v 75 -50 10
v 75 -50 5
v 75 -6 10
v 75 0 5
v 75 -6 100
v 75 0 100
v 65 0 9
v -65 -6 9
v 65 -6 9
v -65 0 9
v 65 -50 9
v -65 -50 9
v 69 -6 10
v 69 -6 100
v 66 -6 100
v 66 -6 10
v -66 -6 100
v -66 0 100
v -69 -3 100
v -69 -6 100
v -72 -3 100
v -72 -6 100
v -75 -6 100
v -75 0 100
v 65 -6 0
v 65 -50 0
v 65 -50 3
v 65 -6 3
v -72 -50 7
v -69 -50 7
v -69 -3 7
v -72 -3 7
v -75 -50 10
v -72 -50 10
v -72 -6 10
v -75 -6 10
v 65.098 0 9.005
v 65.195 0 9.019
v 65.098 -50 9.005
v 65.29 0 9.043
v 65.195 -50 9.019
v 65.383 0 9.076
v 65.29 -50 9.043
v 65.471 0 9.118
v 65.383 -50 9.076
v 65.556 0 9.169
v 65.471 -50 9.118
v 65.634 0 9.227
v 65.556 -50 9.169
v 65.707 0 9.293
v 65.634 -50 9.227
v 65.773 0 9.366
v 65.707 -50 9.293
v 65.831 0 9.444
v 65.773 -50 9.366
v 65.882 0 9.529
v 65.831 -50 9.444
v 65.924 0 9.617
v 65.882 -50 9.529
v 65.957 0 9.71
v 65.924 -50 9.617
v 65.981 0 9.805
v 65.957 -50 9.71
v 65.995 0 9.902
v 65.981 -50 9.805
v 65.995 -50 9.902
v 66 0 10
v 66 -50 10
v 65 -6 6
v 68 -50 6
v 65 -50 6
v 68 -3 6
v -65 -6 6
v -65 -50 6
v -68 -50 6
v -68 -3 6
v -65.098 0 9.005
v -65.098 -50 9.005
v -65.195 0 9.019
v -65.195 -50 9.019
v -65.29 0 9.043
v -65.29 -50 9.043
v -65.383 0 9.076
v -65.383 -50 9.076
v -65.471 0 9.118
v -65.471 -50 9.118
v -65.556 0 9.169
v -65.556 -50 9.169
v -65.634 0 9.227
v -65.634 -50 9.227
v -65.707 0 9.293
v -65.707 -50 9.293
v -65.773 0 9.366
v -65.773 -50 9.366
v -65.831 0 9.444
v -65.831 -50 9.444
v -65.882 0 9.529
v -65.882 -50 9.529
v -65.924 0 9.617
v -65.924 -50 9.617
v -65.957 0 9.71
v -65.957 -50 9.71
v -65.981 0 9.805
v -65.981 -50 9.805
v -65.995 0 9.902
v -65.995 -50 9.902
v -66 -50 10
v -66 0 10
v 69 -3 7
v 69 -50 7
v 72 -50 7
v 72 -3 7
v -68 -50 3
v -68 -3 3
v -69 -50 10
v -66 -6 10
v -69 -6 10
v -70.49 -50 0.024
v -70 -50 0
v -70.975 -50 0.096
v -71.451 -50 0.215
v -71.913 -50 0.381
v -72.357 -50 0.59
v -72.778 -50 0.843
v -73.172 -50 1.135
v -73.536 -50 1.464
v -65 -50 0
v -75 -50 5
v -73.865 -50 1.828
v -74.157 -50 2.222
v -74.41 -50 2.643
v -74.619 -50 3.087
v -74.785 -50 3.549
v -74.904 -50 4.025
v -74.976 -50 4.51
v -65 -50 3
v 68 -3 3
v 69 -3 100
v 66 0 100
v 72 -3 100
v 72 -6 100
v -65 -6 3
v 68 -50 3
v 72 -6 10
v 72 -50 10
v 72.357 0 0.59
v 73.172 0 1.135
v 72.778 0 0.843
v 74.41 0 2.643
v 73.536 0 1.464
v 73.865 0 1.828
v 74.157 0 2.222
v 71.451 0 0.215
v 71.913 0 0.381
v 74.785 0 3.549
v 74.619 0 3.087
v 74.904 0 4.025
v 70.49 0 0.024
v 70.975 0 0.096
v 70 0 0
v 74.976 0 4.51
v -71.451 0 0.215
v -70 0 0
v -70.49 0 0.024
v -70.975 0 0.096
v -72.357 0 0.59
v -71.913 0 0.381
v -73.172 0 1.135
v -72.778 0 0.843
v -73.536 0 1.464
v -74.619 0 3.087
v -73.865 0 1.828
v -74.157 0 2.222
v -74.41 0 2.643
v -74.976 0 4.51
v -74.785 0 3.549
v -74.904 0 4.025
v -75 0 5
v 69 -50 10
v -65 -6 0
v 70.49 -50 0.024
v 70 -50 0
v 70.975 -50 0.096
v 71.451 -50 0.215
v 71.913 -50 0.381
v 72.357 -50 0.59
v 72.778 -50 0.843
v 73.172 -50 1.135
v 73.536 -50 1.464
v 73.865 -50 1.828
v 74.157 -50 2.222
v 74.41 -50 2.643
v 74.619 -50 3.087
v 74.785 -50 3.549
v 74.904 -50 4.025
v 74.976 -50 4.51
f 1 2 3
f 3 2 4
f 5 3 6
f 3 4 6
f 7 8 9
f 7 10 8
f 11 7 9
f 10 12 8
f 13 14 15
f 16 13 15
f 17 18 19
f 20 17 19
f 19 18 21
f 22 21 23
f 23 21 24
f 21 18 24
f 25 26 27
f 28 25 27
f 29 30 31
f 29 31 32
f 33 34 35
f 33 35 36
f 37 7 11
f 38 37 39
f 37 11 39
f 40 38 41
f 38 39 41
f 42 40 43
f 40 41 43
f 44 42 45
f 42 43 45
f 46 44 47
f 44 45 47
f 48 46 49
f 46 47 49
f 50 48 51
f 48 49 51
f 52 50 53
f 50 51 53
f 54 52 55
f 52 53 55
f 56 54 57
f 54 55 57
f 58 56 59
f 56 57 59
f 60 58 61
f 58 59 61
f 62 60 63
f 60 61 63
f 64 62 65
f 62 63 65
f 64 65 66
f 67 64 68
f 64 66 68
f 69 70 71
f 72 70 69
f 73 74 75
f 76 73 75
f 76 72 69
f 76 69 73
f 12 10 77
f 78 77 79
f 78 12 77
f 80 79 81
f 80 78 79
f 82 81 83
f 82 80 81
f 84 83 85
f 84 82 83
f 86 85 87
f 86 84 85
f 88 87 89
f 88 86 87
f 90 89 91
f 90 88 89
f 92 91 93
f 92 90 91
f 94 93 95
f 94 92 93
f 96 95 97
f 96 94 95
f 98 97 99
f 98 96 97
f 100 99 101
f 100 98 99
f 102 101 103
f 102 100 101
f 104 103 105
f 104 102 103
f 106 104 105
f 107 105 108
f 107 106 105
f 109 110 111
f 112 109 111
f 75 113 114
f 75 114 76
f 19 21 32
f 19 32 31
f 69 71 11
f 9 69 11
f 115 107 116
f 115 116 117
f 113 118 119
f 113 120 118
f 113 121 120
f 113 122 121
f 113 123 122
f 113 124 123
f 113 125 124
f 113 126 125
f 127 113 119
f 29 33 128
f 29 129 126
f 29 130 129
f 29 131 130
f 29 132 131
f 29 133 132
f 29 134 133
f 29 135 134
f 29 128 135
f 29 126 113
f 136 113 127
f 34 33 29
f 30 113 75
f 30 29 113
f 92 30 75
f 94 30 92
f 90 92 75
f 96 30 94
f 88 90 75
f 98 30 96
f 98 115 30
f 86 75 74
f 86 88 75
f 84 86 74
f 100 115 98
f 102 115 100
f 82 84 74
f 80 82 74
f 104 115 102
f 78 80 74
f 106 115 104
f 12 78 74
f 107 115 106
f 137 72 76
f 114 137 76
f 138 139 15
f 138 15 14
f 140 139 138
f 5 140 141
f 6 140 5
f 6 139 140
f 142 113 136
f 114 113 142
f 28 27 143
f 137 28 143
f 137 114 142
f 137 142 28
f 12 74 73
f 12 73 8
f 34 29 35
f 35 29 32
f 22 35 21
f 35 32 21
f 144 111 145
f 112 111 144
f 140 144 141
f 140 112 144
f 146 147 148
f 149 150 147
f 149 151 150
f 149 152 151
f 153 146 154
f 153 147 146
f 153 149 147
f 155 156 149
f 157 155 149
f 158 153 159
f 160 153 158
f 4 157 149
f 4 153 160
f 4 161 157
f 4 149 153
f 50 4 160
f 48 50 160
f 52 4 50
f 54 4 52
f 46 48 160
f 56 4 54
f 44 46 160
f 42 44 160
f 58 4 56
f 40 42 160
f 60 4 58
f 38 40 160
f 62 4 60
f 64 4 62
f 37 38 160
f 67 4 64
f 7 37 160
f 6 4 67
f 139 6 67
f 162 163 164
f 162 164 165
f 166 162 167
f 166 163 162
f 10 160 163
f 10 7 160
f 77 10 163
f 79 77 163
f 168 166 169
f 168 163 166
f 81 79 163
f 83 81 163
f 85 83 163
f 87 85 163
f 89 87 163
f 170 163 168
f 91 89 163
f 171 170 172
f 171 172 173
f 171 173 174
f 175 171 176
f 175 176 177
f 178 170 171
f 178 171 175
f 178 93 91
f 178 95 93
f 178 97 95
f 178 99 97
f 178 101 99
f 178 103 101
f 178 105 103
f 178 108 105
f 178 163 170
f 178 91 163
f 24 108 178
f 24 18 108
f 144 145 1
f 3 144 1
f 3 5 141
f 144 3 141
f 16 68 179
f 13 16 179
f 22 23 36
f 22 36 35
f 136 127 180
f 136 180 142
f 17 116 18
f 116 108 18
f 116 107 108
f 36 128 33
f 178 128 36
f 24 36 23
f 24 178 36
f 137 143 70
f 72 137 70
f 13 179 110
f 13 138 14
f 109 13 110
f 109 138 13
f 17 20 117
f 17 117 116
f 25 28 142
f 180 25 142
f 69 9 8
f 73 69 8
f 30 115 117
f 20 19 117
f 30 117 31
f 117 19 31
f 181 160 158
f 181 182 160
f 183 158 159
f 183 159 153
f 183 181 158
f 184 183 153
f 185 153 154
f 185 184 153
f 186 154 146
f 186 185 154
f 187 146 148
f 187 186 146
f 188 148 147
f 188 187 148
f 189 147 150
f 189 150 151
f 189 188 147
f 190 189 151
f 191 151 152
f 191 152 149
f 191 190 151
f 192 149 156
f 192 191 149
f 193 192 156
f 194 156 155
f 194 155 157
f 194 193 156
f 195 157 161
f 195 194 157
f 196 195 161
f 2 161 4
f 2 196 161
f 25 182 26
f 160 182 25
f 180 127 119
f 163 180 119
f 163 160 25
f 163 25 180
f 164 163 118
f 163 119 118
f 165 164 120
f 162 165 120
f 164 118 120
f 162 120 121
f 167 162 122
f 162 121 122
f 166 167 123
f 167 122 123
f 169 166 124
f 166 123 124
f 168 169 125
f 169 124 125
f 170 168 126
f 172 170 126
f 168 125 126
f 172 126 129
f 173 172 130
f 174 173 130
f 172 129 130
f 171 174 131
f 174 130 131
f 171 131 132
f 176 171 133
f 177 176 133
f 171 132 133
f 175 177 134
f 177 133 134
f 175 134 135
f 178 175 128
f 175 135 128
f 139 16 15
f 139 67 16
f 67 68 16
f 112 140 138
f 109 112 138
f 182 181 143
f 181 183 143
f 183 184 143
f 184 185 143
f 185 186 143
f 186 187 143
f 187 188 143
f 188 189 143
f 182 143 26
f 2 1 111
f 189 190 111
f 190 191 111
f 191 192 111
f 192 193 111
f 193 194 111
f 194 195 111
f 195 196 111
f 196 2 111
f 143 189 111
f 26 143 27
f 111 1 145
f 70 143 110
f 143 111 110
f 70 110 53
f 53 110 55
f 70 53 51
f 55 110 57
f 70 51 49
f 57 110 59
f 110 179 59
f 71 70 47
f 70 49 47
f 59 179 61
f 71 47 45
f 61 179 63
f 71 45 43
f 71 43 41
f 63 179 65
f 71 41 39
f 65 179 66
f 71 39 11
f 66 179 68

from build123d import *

# Parameters (mm, degrees)
F1_DEPTH = 50
F0_W     = 3
F0_H     = 90
F0_W_2   = 65
F0_H_2   = 3
F2_DEPTH = 6
F3_DEPTH = 3
F4_R     = 0.99999
F5_R     = 5


# Not quite as in the source:
# - a fillet or chamfer is up to 0.001 mm smaller than in the source, because OpenCascade refuses the exact size


with BuildPart() as f1:
    # F0 (on Front) → F1 (new body)
    with BuildSketch(Plane.XZ):
        Polygon((-67, 6), (-65, 6), (-65, 9), (-66, 9), (-66, 10), (-69, 10), (-69, 9), (-69, 7), (-69, 6), (-68, 6), align=None)
        Polygon((-72, 3), (-68, 3), (-68, 6), (-69, 6), (-69, 7), (-72, 7), align=None)
        Polygon((-75, 0), (-65, 0), (-65, 3), (-68, 3), (-72, 3), (-72, 7), (-72, 10), (-75, 10), align=None)
    extrude(amount=F1_DEPTH)

    # F0 (on Front) → F2 (join)
    with BuildSketch(Plane.XZ):
        with Locations((-73.5, 55)):
            Rectangle(F0_W, F0_H)
        with Locations((-67.5, 55)):
            Rectangle(F0_W, F0_H)
        with Locations((-32.5, 7.5)):
            Rectangle(F0_W_2, F0_H_2)
        with Locations((-32.5, 1.5)):
            Rectangle(F0_W_2, F0_H_2)
    extrude(amount=F2_DEPTH)

    # F0 (on Front) → F3 (join)
    with BuildSketch(Plane.XZ):
        Polygon((-72, 100), (-72, 10), (-72, 7), (-69, 7), (-69, 9), (-69, 10), (-69, 100), align=None)
        Polygon((-65, 3), (0, 3), (0, 6), (-65, 6), (-67, 6), (-68, 6), (-68, 3), align=None)
    extrude(amount=F3_DEPTH)

    # F4 (radius 1 in the source; OpenCascade refuses exactly that, so slightly less here)
    f4_edges = [f1.edges().sort_by_distance(p)[0] for p in [
        (-66, -25, 9),
    ]]
    fillet(f4_edges, radius=F4_R)

    # F5
    f5_edges = [f1.edges().sort_by_distance(p)[0] for p in [
        (-75, -25, 0),
    ]]
    fillet(f5_edges, radius=F5_R)

    # F6: F1 across plane


with BuildPart() as f1_1:
    add(f1.part)
    add(f1.part.mirror(Plane.YZ))


solid = f1_1.part
